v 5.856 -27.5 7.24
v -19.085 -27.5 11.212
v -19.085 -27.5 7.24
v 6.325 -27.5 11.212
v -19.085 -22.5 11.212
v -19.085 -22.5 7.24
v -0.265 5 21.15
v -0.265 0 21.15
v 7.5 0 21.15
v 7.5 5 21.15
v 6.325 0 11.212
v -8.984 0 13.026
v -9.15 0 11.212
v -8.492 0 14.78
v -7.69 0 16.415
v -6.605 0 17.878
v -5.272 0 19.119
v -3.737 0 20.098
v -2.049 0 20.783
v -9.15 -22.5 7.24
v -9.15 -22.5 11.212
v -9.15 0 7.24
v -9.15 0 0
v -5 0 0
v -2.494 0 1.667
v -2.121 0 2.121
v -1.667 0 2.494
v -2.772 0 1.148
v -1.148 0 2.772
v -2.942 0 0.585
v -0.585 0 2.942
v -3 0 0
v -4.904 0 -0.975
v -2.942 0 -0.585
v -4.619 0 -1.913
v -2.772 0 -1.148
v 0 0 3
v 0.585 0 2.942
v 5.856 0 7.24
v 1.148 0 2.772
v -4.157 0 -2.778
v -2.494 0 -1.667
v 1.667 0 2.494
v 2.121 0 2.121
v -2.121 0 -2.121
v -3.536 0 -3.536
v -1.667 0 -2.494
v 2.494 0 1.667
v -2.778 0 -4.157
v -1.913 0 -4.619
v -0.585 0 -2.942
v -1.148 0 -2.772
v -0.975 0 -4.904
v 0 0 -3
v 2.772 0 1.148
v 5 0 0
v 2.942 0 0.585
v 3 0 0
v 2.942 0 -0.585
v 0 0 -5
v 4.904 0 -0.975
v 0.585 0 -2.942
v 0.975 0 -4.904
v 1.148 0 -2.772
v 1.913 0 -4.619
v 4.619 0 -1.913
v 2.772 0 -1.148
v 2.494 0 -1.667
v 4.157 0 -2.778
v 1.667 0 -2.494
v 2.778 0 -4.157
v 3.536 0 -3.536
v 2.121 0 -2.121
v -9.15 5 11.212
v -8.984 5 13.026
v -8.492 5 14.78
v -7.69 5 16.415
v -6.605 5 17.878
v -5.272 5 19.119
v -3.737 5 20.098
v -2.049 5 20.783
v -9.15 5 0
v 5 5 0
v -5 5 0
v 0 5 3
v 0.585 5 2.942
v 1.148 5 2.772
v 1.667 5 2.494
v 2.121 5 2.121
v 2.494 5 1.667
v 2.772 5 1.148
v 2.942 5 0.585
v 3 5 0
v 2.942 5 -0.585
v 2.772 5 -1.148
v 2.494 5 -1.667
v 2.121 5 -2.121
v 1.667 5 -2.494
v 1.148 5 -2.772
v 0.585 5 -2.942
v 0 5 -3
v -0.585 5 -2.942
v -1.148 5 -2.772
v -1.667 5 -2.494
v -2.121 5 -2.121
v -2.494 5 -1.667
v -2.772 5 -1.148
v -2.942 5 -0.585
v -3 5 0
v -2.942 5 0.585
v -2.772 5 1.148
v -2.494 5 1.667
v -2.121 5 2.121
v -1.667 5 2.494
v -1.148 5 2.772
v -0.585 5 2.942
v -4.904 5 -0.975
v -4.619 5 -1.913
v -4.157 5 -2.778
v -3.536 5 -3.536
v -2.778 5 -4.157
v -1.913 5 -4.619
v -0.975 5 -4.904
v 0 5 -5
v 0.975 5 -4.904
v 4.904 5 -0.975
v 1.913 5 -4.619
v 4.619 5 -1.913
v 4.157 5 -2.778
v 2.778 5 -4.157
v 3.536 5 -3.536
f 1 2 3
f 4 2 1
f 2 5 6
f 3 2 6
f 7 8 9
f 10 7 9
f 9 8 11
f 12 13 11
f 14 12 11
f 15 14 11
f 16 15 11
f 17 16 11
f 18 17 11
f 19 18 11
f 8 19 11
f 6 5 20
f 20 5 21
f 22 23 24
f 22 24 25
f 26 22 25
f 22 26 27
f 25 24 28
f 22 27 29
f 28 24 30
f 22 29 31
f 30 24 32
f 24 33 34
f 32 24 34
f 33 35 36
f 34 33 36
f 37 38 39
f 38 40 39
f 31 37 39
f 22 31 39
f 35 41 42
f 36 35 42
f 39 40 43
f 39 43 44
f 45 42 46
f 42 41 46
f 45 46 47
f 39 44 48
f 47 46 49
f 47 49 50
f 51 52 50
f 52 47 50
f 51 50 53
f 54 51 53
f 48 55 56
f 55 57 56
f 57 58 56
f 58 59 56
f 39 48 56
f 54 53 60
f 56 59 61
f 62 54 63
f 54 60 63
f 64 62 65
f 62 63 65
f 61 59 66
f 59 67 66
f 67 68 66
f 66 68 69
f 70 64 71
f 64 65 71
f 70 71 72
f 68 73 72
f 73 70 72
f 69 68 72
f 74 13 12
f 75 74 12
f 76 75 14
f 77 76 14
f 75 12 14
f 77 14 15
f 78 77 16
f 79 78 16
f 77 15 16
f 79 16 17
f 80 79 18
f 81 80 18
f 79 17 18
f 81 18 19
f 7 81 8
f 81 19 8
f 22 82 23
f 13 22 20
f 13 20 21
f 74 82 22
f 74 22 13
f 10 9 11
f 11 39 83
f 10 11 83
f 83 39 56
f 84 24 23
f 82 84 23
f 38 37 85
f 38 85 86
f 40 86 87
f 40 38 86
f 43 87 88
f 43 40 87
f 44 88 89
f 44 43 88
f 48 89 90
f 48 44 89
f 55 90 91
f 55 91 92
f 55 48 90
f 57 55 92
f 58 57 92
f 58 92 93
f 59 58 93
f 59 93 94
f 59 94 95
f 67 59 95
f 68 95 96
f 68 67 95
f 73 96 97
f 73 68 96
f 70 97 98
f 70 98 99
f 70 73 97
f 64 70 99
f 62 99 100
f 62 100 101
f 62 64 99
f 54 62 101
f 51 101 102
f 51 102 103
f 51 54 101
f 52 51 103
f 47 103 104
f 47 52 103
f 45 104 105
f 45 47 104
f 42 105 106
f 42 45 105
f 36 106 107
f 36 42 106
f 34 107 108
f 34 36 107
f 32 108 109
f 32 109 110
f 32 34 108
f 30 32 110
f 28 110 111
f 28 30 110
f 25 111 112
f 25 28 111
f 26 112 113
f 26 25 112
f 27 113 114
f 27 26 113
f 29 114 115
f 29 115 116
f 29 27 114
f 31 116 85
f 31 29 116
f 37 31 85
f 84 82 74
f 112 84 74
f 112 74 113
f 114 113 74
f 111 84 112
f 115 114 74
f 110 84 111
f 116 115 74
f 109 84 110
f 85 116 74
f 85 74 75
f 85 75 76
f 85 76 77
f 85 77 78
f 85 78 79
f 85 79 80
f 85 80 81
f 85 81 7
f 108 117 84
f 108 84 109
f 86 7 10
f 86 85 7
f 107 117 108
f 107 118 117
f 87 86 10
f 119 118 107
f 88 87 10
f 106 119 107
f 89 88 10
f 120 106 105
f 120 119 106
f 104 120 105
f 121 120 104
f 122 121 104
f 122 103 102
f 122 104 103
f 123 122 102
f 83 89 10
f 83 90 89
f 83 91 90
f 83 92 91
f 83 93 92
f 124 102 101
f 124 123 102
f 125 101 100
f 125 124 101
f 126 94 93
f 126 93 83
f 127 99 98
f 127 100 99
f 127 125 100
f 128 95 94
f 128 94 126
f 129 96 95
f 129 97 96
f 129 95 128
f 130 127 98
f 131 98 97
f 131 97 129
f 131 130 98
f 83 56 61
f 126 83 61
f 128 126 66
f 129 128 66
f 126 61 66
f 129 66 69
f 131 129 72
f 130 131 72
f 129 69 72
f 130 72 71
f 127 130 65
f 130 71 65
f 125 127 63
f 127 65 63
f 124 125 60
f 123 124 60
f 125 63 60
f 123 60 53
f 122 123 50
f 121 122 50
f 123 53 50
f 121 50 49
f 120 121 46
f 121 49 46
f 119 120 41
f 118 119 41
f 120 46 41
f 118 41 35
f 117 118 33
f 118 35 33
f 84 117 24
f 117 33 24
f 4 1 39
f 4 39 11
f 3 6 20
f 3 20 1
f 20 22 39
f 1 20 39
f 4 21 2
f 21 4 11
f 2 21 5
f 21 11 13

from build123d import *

# Parameters (mm, degrees)
CROQUIS2_R              = 3
SALIENTE_EXTRUIR1_DEPTH = 5
SALIENTE_EXTRUIR2_DEPTH = 22.5
SALIENTE_EXTRUIR3_DEPTH = 5


with BuildPart() as part:
    # Croquis2 → Saliente-Extruir1 (new body)
    with BuildSketch(Plane(origin=(0, 0, 0), x_dir=(1, 0, 0), z_dir=(0, 1, 0))):
        with BuildLine():
            Line((7.5, -21.15), (5, 0))
            ThreePointArc((5, 0), (0, 5), (-5, 0))
            Line((-5, 0), (-9.15, 0))
            Line((-9.15, 0), (-9.15, -11.212351015))
            ThreePointArc((-9.15, -11.212351015), (-6.604850295, -17.877574723), (-0.264958583, -21.15))
            Line((-0.264958583, -21.15), (-0.127201334, -21.15))
            Line((-0.127201334, -21.15), (7.5, -21.15))
        make_face()
        with Locations(Location((0, 0, 0), (0, 0, 270))):
            Circle(CROQUIS2_R, mode=Mode.SUBTRACT)
    extrude(amount=SALIENTE_EXTRUIR1_DEPTH)

    # Croquis3 → Saliente-Extruir2 (add)
    with BuildSketch(Plane.XZ):
        Polygon((-9.15, 11.212351015), (6.325336999, 11.212351015), (5.855792624, 7.240005602), (-9.15, 7.240005602), align=None)
    extrude(amount=SALIENTE_EXTRUIR2_DEPTH)

    # Croquis4 → Saliente-Extruir3 (add)
    with BuildSketch(Plane.XZ.offset(22.5)):
        Polygon((5.855792624, 7.240005602), (6.325336999, 11.212351015), (-19.085175152, 11.212351015), (-19.085175152, 7.240005602), align=None)
    extrude(amount=SALIENTE_EXTRUIR3_DEPTH)


solid = part.part
